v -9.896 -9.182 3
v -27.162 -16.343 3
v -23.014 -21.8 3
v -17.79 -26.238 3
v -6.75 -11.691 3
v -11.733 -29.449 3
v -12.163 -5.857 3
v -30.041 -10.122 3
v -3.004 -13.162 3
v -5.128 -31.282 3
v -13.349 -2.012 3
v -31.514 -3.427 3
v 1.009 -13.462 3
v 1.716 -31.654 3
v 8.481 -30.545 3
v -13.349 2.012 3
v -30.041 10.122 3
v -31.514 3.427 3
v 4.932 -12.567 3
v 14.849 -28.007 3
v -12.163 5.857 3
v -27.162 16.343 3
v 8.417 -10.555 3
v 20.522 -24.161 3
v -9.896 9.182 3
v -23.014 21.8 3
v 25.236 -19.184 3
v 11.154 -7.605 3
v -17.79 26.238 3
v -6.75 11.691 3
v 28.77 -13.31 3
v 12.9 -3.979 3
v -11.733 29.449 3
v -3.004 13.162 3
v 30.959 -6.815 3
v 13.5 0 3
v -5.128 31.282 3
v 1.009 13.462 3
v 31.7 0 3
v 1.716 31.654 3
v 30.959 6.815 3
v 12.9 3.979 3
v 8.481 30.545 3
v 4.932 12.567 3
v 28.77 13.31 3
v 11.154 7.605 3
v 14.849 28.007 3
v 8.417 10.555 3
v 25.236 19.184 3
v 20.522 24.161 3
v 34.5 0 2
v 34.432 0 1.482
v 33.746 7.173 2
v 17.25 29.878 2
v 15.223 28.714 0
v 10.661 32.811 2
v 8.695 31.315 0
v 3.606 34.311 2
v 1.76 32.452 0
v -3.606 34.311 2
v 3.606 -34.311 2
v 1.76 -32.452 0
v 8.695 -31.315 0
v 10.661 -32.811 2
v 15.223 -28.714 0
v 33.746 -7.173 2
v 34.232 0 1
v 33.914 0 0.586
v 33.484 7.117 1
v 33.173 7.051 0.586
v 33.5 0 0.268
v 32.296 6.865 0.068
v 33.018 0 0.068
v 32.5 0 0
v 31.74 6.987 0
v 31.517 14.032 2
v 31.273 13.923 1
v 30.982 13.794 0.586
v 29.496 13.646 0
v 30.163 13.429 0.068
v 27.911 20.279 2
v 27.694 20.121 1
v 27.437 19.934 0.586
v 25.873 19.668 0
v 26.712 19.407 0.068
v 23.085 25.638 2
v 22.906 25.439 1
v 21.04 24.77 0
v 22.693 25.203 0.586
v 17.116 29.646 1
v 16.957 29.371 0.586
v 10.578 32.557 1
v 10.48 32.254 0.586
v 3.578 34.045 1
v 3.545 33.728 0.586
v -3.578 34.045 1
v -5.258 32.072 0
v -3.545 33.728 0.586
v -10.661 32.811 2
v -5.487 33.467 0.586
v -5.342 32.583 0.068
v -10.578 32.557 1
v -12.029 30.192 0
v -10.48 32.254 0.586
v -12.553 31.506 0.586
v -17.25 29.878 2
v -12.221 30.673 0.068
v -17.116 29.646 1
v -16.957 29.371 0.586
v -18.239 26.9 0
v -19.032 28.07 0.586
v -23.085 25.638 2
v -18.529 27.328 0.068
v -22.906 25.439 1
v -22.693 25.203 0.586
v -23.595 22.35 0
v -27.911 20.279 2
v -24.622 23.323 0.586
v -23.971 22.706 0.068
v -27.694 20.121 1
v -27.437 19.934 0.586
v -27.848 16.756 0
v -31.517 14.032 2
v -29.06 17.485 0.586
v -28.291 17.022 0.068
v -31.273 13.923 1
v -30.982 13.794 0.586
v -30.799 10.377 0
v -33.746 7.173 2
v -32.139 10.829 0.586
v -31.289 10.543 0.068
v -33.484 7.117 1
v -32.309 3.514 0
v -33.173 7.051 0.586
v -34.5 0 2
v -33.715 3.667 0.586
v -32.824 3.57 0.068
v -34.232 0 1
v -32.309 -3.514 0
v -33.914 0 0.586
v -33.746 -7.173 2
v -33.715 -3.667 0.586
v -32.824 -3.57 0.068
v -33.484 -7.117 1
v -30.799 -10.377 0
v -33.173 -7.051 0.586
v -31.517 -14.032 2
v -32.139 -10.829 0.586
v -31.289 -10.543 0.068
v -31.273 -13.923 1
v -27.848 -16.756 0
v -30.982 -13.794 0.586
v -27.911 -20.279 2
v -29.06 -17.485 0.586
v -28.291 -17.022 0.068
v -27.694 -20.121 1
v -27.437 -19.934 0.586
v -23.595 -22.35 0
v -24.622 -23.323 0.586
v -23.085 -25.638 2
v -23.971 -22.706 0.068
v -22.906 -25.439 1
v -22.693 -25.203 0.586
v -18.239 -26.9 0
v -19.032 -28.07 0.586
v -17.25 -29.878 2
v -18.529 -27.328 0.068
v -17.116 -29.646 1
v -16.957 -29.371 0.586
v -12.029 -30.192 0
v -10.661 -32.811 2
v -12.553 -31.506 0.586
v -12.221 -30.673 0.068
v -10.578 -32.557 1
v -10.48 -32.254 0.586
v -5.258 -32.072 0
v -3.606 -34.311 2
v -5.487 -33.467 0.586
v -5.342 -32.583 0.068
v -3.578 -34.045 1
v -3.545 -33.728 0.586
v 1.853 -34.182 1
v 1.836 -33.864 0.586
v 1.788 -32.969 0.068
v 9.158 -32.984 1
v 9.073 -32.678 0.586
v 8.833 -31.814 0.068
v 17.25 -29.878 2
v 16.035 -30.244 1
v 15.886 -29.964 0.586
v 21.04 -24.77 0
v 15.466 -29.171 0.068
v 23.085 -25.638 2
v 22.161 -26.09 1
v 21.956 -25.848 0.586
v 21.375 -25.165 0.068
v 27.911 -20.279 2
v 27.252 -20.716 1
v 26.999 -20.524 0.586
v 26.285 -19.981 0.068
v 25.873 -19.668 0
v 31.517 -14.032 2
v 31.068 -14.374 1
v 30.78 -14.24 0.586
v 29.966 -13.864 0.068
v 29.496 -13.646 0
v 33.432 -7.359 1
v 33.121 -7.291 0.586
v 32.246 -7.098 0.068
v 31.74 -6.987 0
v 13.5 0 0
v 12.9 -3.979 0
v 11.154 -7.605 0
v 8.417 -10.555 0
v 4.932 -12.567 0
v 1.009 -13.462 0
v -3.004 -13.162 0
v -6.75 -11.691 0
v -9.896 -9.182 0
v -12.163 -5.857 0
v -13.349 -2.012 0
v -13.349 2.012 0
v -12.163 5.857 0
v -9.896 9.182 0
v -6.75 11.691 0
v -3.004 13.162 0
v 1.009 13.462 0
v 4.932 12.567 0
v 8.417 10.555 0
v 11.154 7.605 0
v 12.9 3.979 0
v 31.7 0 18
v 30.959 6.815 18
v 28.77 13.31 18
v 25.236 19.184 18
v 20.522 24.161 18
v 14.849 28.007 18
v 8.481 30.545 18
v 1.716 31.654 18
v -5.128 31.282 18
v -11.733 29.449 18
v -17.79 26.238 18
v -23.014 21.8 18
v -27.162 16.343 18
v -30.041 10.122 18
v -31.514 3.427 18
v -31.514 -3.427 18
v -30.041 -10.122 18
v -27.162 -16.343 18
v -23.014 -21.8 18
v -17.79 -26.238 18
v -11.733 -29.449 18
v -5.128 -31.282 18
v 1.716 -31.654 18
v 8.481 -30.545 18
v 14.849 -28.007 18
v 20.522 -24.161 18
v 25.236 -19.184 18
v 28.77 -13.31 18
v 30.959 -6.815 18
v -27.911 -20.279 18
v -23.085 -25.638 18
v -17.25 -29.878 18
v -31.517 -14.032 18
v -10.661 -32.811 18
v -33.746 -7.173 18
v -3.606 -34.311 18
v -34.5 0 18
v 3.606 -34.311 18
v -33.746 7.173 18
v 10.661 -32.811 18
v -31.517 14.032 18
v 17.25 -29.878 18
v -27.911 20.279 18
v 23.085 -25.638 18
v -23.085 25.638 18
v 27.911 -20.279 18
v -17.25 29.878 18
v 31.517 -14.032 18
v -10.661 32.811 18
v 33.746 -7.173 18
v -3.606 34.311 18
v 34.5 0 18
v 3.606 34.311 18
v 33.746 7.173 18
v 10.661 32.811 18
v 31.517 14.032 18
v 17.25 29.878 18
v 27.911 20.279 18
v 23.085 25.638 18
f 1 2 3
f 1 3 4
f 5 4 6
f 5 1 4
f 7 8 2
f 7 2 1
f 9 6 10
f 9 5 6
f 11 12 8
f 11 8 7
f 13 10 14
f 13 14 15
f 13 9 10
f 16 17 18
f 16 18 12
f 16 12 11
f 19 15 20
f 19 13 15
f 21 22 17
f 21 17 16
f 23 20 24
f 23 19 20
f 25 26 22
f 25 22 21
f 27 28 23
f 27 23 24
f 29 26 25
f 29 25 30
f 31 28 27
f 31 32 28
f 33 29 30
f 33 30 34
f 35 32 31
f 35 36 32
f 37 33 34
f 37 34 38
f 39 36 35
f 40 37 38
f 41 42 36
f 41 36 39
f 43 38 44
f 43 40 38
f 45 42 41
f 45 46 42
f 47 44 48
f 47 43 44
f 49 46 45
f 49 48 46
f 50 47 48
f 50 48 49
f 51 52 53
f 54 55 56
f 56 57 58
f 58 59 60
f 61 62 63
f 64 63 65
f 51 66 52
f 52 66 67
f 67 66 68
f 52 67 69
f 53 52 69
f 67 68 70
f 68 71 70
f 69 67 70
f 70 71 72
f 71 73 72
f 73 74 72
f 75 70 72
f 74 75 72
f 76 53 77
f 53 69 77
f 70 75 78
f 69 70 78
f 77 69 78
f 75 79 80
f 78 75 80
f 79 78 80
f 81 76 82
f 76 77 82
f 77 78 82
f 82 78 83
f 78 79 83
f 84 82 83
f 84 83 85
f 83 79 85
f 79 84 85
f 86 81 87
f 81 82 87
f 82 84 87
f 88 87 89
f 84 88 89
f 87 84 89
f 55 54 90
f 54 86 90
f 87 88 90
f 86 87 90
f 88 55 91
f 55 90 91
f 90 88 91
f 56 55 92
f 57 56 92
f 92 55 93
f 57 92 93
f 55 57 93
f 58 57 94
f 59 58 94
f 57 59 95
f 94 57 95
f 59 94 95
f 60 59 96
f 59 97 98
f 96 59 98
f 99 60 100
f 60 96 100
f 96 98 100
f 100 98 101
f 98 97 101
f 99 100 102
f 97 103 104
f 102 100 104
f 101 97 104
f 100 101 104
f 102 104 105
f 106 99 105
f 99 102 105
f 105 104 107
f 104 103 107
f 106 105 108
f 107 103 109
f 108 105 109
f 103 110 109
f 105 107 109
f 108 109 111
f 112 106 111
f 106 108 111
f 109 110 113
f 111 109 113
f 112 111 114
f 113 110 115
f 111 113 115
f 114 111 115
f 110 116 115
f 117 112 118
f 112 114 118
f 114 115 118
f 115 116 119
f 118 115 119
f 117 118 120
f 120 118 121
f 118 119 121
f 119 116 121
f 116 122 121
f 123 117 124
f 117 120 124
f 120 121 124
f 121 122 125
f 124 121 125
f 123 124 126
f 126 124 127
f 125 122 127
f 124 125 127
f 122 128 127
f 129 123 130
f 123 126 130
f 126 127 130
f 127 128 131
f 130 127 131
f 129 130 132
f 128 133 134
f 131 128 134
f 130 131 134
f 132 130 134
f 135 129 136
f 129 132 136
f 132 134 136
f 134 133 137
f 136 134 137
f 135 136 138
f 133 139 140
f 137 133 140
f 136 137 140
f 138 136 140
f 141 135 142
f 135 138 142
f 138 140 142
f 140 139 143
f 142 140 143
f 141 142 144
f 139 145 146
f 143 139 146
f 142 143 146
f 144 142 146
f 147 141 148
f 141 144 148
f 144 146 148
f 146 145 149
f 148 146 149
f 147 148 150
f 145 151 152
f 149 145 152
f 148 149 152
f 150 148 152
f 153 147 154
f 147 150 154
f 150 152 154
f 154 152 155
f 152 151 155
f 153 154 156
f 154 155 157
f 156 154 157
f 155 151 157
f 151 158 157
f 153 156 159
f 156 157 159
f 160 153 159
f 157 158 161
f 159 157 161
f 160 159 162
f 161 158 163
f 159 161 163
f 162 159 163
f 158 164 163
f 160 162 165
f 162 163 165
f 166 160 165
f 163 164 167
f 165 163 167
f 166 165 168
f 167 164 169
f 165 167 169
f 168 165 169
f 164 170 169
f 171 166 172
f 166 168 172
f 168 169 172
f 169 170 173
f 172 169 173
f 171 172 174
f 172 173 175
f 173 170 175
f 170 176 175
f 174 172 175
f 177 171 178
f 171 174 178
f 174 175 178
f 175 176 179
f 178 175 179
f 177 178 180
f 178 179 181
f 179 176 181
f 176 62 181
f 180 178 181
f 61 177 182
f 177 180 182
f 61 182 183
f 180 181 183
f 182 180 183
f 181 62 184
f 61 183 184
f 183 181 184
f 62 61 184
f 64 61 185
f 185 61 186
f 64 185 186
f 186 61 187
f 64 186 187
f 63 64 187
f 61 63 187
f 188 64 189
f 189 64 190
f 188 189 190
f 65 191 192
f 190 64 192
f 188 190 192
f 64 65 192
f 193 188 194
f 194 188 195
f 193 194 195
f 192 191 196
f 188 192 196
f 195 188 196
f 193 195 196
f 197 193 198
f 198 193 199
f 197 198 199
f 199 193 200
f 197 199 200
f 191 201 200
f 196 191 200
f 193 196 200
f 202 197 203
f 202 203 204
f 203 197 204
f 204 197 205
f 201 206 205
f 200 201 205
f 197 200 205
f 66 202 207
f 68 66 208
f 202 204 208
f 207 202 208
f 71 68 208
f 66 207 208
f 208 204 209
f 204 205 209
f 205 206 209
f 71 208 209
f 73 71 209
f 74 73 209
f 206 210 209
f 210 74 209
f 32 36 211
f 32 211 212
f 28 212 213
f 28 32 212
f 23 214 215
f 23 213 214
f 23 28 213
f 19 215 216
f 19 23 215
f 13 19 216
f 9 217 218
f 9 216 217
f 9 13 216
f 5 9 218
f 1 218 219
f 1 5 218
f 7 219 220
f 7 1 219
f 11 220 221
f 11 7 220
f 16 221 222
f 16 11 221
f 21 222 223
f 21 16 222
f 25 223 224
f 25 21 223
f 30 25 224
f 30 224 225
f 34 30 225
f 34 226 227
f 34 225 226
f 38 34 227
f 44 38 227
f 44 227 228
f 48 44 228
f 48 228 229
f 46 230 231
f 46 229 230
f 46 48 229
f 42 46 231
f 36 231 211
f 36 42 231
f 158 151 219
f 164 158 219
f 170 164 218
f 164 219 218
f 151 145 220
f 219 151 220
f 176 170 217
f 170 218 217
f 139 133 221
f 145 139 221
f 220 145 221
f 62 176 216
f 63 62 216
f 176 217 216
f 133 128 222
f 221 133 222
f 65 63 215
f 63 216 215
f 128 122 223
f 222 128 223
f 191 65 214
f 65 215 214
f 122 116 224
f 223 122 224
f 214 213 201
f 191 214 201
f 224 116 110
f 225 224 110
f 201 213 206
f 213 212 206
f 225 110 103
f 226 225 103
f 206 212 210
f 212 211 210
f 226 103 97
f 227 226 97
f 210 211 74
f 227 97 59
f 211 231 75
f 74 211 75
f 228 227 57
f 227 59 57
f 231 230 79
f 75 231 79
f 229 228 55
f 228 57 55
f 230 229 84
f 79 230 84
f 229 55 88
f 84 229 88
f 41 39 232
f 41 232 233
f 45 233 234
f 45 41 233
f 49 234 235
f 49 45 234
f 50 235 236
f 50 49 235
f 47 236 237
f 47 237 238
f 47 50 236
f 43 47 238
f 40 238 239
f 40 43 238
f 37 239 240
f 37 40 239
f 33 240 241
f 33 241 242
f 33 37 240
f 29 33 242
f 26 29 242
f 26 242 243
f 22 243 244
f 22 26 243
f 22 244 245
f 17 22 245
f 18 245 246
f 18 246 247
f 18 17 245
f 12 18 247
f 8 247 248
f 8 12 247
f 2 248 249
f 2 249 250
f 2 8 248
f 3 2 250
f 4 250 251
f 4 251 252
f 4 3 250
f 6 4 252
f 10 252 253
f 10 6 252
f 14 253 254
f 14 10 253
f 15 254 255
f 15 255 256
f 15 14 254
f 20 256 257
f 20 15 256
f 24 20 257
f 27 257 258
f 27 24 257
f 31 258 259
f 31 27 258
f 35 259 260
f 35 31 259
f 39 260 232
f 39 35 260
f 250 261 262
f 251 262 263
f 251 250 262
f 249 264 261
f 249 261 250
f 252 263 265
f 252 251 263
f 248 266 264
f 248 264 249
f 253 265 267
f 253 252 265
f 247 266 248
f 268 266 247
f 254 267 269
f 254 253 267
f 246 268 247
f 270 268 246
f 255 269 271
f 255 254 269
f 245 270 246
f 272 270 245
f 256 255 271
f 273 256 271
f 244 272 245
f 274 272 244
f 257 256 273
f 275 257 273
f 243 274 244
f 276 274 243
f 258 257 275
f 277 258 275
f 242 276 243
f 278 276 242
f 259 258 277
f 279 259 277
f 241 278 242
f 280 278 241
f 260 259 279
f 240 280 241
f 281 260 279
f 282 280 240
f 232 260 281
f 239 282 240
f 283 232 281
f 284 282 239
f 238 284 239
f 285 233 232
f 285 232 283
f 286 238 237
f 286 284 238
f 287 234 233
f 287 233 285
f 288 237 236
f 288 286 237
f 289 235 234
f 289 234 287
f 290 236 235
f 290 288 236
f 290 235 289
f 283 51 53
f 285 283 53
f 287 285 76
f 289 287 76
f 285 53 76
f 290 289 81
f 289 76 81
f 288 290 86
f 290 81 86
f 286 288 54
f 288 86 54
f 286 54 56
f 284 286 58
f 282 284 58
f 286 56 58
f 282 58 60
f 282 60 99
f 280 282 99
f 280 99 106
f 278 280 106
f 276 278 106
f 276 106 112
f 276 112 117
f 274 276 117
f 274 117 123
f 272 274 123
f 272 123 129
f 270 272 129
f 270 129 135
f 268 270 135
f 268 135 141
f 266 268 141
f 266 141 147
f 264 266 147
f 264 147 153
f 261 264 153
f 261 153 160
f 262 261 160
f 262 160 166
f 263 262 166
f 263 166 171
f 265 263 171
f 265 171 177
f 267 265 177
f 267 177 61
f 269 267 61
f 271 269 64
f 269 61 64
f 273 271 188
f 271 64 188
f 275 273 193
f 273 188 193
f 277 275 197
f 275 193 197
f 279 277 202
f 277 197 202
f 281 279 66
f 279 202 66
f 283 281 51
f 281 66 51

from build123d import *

# Parameters (mm, degrees)
ESQUISSE1_R                  = 34.5
BOSS_EXTRU_1_DEPTH           = 3
ESQUISSE2_R                  = 34.5
ESQUISSE2_R_2                = 31.7
BOSS_EXTRU_2_DEPTH           = 15
ENL_V_MAT_EXTRU_1_DEPTH      = 53.00480747
ENL_V_MAT_EXTRU_1_DEPTH_BACK = 53.00480747
ESQUISSE3_R                  = 13.5
CONG_1_R                     = 2


with BuildPart() as part:
    # Esquisse1 → Boss.-Extru.1 (new body)
    with BuildSketch(Plane.XY):
        Circle(ESQUISSE1_R)
    extrude(amount=BOSS_EXTRU_1_DEPTH)

    # Esquisse2 → Boss.-Extru.2 (add)
    with BuildSketch(Plane.XY.offset(3)):
        Circle(ESQUISSE2_R)
        Circle(ESQUISSE2_R_2, mode=Mode.SUBTRACT)
    extrude(amount=BOSS_EXTRU_2_DEPTH)

    # Esquisse3 → Enlèv. mat.-Extru.1 (cut, two sides: drawn at the far end of the back side and taken through both)
    with BuildSketch(Plane(origin=(0, 0, 0), x_dir=(-1, 0, 0), z_dir=(0, 0, -1)).offset(-ENL_V_MAT_EXTRU_1_DEPTH_BACK)):
        with Locations(Location((0, 0, 0), (0, 0, 180))):
            Circle(ESQUISSE3_R)
    extrude(amount=ENL_V_MAT_EXTRU_1_DEPTH + ENL_V_MAT_EXTRU_1_DEPTH_BACK, mode=Mode.SUBTRACT)

    # Congé1
    cong_1_edges = [part.edges().sort_by_distance(p)[0] for p in [
        (-34.5, 0, 0),
    ]]
    fillet(cong_1_edges, radius=CONG_1_R)


solid = part.part
